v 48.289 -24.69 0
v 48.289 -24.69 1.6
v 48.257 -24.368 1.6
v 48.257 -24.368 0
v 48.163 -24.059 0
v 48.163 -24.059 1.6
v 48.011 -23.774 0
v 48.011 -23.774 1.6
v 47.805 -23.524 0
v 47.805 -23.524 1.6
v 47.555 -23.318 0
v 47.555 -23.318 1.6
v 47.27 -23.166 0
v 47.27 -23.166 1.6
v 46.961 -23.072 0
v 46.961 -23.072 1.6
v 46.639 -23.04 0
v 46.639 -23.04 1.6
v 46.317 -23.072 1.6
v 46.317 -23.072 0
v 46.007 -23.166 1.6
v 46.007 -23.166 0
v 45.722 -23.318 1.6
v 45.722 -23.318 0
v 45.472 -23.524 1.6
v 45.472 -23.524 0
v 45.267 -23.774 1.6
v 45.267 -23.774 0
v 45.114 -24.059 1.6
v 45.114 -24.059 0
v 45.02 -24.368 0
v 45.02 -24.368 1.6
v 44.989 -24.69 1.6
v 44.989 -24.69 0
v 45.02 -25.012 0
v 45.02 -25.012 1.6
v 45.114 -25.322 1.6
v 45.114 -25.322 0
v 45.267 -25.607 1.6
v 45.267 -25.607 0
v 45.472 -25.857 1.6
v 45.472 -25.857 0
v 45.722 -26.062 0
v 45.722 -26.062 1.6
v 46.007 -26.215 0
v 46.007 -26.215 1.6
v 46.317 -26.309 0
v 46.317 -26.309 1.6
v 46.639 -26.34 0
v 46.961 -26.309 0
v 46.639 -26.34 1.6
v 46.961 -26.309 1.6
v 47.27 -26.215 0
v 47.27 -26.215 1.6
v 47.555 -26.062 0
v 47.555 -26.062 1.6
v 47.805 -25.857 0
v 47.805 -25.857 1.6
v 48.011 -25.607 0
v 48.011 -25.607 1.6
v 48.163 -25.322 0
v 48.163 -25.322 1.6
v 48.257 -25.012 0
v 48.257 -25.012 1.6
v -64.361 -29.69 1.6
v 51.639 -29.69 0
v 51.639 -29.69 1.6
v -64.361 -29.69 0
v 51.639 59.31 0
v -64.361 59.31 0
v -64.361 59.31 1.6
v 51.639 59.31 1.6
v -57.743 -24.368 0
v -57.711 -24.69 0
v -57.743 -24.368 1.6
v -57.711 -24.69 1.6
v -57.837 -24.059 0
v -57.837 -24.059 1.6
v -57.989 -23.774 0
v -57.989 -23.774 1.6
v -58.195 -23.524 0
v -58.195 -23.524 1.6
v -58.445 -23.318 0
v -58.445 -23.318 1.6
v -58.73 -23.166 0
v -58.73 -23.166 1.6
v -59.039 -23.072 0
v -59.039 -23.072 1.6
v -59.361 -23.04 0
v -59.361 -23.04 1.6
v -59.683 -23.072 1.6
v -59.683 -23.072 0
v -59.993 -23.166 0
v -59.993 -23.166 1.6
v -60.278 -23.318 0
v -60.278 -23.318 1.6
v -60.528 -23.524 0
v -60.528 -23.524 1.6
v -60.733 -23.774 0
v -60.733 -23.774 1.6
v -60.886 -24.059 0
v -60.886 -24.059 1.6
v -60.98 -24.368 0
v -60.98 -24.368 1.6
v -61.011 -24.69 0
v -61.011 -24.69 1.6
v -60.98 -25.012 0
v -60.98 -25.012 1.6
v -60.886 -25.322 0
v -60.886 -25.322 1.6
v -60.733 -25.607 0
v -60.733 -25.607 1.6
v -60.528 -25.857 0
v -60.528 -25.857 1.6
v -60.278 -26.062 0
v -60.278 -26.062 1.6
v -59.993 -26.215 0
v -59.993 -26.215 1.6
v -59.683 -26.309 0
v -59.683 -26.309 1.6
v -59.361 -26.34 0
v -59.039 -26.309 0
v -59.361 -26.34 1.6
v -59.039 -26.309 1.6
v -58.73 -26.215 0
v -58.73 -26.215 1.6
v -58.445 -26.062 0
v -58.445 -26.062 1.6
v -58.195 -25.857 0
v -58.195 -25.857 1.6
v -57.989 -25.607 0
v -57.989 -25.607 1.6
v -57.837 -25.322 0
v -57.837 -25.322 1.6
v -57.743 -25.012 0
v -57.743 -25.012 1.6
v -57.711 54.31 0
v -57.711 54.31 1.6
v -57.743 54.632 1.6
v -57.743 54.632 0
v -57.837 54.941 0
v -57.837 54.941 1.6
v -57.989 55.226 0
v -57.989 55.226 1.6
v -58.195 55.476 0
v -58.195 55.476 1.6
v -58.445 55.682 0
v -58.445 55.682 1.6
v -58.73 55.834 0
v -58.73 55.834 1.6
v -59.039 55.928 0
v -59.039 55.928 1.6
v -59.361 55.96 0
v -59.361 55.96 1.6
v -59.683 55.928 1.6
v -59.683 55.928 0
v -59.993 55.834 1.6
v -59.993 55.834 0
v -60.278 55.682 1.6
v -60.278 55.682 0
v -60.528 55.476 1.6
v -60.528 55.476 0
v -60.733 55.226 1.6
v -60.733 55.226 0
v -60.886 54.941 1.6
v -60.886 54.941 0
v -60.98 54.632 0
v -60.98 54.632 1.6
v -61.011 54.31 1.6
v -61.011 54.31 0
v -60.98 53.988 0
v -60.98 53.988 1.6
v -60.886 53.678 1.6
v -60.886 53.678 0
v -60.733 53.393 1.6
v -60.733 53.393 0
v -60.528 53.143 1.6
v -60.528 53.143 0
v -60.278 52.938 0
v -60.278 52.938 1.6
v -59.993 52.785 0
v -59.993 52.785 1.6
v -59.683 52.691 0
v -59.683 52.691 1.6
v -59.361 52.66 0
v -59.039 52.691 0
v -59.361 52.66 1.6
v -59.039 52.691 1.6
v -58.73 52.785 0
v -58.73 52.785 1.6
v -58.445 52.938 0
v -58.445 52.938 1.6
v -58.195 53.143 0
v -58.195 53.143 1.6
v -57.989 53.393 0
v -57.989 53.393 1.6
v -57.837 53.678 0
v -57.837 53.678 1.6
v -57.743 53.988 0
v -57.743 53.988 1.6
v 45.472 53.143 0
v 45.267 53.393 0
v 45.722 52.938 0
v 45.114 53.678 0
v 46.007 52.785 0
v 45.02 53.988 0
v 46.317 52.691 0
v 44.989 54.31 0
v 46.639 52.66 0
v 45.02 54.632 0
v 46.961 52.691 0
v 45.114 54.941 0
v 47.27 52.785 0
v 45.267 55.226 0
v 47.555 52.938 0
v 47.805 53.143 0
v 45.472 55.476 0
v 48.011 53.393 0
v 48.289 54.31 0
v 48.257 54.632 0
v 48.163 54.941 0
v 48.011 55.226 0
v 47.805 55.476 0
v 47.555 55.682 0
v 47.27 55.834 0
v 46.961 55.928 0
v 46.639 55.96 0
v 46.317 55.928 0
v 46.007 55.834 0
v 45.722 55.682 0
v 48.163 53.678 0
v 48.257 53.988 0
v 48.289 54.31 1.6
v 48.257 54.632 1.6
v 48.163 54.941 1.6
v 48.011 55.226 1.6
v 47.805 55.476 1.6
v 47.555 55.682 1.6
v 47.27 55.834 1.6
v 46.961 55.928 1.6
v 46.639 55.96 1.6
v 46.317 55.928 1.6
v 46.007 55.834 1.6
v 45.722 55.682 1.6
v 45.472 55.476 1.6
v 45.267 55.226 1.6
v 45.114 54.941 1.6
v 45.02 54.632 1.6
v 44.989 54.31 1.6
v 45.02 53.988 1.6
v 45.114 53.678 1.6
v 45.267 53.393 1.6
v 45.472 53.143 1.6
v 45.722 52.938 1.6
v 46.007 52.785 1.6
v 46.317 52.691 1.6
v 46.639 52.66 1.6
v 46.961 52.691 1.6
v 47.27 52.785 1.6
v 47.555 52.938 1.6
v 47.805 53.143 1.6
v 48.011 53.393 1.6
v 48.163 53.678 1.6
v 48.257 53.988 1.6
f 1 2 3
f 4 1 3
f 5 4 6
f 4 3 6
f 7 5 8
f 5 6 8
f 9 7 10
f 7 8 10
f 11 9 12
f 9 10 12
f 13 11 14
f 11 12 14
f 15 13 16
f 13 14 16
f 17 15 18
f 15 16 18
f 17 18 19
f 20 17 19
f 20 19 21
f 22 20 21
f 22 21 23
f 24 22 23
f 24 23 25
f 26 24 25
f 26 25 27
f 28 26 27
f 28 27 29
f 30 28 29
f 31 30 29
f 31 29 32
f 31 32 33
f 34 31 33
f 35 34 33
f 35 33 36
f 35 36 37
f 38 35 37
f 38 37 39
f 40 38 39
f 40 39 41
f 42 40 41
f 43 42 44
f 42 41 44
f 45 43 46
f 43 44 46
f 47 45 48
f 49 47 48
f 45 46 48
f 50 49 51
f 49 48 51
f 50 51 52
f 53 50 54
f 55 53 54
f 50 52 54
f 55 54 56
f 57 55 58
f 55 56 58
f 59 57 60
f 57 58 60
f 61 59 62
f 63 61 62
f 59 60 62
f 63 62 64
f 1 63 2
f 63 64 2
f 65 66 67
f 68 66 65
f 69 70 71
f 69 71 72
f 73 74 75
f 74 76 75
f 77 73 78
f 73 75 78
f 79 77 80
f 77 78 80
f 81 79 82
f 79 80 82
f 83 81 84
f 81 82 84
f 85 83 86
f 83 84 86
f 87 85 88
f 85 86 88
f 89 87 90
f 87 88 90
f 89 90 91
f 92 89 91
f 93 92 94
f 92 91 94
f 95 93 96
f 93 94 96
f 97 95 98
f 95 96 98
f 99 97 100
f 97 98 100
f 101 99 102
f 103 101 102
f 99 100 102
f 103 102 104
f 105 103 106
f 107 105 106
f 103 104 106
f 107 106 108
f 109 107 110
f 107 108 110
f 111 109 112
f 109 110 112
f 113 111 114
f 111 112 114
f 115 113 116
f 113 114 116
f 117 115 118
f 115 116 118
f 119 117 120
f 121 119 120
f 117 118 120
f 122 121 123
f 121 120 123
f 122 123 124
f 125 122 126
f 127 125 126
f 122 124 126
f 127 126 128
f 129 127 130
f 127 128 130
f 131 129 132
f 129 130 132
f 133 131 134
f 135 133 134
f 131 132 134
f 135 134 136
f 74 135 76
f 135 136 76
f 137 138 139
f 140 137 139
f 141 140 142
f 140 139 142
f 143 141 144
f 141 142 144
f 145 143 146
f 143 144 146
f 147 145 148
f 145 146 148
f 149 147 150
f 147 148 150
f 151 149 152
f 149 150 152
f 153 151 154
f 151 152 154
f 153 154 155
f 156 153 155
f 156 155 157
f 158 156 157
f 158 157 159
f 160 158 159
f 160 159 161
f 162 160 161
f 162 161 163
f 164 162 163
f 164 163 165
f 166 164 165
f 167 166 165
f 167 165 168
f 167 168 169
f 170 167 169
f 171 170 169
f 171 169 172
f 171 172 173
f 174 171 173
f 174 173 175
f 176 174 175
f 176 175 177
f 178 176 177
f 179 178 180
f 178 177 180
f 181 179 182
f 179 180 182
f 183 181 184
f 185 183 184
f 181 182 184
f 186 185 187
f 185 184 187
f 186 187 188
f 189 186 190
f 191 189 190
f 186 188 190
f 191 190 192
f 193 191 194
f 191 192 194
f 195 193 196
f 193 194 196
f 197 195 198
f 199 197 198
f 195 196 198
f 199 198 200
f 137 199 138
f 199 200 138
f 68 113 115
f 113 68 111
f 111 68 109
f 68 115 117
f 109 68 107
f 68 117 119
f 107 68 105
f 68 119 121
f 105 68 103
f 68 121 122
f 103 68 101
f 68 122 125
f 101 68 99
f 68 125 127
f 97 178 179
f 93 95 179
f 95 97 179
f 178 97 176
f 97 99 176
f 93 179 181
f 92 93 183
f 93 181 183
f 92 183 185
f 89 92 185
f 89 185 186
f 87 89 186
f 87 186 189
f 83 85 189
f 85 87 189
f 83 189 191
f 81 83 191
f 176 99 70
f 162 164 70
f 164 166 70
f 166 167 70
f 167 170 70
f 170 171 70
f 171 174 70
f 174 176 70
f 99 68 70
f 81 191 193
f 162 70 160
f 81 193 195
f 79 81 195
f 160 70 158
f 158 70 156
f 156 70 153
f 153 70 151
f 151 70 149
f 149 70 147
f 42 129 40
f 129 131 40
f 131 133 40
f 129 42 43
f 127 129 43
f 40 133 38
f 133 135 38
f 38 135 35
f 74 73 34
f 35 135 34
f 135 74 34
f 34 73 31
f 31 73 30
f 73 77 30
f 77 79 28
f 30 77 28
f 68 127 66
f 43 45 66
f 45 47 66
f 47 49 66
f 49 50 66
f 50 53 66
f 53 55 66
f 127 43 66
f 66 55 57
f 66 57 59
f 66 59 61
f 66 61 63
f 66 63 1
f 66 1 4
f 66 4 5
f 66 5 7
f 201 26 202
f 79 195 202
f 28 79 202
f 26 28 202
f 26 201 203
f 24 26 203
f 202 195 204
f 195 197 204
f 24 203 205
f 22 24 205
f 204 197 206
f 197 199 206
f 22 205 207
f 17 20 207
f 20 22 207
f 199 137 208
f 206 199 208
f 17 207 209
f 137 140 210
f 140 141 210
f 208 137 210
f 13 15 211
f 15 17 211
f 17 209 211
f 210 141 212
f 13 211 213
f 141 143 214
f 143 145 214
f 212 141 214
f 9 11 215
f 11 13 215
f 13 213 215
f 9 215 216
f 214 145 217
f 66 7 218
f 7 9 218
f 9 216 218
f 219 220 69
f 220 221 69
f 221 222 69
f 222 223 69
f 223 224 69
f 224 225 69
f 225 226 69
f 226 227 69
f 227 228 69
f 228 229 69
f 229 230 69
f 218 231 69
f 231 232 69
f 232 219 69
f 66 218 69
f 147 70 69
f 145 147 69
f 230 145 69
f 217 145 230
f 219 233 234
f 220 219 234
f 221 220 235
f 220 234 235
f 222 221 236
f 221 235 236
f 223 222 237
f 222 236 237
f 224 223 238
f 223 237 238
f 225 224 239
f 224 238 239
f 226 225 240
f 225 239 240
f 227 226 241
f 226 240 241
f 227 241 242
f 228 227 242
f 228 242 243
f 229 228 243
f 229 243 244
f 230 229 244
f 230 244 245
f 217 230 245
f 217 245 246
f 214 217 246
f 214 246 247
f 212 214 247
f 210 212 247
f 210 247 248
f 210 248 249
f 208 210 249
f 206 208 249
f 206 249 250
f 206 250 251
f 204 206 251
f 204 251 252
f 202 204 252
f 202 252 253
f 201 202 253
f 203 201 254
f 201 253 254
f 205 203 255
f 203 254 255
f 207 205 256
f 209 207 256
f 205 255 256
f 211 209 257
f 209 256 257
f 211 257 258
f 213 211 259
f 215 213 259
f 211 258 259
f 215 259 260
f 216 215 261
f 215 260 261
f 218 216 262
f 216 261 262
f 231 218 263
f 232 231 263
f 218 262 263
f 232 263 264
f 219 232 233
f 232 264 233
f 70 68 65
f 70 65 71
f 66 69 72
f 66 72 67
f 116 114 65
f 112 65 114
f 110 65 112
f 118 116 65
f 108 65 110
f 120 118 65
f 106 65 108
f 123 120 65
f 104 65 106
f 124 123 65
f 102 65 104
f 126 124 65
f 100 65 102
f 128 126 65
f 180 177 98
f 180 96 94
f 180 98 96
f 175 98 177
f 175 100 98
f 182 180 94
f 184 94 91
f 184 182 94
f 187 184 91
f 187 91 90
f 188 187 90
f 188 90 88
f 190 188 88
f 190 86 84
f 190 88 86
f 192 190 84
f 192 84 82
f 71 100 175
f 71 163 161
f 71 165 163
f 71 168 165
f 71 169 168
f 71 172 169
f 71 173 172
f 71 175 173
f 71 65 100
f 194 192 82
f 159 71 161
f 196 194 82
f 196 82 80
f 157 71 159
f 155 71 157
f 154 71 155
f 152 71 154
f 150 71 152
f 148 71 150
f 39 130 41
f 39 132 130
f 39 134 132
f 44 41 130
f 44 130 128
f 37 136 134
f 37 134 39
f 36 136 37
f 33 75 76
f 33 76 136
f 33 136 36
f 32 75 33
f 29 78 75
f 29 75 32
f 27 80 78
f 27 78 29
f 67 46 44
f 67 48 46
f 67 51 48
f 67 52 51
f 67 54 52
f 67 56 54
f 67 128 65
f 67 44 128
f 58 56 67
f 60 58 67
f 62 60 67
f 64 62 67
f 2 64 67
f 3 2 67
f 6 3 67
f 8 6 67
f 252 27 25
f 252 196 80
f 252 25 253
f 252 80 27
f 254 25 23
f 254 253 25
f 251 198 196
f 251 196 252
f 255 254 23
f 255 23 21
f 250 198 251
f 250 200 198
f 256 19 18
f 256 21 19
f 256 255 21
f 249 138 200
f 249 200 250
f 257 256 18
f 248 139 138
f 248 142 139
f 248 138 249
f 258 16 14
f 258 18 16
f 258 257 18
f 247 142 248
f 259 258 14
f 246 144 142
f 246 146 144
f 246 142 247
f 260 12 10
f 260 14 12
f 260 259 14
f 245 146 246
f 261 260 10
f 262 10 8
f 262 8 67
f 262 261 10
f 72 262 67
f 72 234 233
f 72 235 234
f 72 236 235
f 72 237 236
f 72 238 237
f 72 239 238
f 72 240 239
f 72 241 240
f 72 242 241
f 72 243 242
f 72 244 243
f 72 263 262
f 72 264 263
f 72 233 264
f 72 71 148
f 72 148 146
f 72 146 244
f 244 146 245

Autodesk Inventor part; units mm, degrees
ref_plane "YZ Plane" through (0, 0, 0) normal (1, 0, 0) x (0, 1, 0)
ref_plane "XZ Plane" through (0, 0, 0) normal (0, 1, 0) x (-1, 0, 0)
ref_plane "XY Plane" through (0, 0, 0) normal (0, 0, 1) x (1, 0, 0)
sketch "Esquisse1" plane through (0, 0, 0) normal (0, 0, 1) x (1, 0, 0)
  line L0 (51.6387, -29.6903) -> (-64.3613, -29.6903)
  line L1 (-64.3613, -29.6903) -> (-64.3613, 59.3097)
  line L2 (-64.3613, 59.3097) -> (51.6387, 59.3097)
  line L3 (51.6387, 59.3097) -> (51.6387, -29.6903)
  point P0 (0, 0)
  dimension "d0" = 116
  dimension "d2" = 89
extrude "Extrusion1" add sketch "Esquisse1" along normal blind 1.6
sketch "Esquisse2" plane through (0, 0, 1.6) normal (0, 0, 1) x (1, 0, 0)
  line L0 (-64.3613, -29.6903) -> (51.6387, -29.6903) projected
  line L1 (51.6387, 59.3097) -> (-64.3613, 59.3097) projected
  line L2 (-64.3613, 59.3097) -> (-64.3613, -29.6903) projected
  circle A0 centre (-59.3613, 54.3097) radius 1.65
  circle A1 centre (-59.3613, -24.6903) radius 1.65
  circle A2 centre (46.6387, -24.6903) radius 1.65
  circle A3 centre (46.6387, 54.3097) radius 1.65
  point P0 (0, 0)
  dimension "d5" = 3.3
  dimension "d7" = 3.3
  dimension "d8" = 3.3
  dimension "d9" = 3.3
  dimension "d10" = 79
  dimension "d11" = 79
  dimension "d12" = 5
  dimension "d13" = 5
  dimension "d14" = 106
  dimension "d15" = 106
  dimension "d16" = 5
  dimension "d17" = 5
extrude "Extrusion2" cut sketch "Esquisse2" against normal blind 1.6
properties part number "pcb" material "Résine phénolique"
